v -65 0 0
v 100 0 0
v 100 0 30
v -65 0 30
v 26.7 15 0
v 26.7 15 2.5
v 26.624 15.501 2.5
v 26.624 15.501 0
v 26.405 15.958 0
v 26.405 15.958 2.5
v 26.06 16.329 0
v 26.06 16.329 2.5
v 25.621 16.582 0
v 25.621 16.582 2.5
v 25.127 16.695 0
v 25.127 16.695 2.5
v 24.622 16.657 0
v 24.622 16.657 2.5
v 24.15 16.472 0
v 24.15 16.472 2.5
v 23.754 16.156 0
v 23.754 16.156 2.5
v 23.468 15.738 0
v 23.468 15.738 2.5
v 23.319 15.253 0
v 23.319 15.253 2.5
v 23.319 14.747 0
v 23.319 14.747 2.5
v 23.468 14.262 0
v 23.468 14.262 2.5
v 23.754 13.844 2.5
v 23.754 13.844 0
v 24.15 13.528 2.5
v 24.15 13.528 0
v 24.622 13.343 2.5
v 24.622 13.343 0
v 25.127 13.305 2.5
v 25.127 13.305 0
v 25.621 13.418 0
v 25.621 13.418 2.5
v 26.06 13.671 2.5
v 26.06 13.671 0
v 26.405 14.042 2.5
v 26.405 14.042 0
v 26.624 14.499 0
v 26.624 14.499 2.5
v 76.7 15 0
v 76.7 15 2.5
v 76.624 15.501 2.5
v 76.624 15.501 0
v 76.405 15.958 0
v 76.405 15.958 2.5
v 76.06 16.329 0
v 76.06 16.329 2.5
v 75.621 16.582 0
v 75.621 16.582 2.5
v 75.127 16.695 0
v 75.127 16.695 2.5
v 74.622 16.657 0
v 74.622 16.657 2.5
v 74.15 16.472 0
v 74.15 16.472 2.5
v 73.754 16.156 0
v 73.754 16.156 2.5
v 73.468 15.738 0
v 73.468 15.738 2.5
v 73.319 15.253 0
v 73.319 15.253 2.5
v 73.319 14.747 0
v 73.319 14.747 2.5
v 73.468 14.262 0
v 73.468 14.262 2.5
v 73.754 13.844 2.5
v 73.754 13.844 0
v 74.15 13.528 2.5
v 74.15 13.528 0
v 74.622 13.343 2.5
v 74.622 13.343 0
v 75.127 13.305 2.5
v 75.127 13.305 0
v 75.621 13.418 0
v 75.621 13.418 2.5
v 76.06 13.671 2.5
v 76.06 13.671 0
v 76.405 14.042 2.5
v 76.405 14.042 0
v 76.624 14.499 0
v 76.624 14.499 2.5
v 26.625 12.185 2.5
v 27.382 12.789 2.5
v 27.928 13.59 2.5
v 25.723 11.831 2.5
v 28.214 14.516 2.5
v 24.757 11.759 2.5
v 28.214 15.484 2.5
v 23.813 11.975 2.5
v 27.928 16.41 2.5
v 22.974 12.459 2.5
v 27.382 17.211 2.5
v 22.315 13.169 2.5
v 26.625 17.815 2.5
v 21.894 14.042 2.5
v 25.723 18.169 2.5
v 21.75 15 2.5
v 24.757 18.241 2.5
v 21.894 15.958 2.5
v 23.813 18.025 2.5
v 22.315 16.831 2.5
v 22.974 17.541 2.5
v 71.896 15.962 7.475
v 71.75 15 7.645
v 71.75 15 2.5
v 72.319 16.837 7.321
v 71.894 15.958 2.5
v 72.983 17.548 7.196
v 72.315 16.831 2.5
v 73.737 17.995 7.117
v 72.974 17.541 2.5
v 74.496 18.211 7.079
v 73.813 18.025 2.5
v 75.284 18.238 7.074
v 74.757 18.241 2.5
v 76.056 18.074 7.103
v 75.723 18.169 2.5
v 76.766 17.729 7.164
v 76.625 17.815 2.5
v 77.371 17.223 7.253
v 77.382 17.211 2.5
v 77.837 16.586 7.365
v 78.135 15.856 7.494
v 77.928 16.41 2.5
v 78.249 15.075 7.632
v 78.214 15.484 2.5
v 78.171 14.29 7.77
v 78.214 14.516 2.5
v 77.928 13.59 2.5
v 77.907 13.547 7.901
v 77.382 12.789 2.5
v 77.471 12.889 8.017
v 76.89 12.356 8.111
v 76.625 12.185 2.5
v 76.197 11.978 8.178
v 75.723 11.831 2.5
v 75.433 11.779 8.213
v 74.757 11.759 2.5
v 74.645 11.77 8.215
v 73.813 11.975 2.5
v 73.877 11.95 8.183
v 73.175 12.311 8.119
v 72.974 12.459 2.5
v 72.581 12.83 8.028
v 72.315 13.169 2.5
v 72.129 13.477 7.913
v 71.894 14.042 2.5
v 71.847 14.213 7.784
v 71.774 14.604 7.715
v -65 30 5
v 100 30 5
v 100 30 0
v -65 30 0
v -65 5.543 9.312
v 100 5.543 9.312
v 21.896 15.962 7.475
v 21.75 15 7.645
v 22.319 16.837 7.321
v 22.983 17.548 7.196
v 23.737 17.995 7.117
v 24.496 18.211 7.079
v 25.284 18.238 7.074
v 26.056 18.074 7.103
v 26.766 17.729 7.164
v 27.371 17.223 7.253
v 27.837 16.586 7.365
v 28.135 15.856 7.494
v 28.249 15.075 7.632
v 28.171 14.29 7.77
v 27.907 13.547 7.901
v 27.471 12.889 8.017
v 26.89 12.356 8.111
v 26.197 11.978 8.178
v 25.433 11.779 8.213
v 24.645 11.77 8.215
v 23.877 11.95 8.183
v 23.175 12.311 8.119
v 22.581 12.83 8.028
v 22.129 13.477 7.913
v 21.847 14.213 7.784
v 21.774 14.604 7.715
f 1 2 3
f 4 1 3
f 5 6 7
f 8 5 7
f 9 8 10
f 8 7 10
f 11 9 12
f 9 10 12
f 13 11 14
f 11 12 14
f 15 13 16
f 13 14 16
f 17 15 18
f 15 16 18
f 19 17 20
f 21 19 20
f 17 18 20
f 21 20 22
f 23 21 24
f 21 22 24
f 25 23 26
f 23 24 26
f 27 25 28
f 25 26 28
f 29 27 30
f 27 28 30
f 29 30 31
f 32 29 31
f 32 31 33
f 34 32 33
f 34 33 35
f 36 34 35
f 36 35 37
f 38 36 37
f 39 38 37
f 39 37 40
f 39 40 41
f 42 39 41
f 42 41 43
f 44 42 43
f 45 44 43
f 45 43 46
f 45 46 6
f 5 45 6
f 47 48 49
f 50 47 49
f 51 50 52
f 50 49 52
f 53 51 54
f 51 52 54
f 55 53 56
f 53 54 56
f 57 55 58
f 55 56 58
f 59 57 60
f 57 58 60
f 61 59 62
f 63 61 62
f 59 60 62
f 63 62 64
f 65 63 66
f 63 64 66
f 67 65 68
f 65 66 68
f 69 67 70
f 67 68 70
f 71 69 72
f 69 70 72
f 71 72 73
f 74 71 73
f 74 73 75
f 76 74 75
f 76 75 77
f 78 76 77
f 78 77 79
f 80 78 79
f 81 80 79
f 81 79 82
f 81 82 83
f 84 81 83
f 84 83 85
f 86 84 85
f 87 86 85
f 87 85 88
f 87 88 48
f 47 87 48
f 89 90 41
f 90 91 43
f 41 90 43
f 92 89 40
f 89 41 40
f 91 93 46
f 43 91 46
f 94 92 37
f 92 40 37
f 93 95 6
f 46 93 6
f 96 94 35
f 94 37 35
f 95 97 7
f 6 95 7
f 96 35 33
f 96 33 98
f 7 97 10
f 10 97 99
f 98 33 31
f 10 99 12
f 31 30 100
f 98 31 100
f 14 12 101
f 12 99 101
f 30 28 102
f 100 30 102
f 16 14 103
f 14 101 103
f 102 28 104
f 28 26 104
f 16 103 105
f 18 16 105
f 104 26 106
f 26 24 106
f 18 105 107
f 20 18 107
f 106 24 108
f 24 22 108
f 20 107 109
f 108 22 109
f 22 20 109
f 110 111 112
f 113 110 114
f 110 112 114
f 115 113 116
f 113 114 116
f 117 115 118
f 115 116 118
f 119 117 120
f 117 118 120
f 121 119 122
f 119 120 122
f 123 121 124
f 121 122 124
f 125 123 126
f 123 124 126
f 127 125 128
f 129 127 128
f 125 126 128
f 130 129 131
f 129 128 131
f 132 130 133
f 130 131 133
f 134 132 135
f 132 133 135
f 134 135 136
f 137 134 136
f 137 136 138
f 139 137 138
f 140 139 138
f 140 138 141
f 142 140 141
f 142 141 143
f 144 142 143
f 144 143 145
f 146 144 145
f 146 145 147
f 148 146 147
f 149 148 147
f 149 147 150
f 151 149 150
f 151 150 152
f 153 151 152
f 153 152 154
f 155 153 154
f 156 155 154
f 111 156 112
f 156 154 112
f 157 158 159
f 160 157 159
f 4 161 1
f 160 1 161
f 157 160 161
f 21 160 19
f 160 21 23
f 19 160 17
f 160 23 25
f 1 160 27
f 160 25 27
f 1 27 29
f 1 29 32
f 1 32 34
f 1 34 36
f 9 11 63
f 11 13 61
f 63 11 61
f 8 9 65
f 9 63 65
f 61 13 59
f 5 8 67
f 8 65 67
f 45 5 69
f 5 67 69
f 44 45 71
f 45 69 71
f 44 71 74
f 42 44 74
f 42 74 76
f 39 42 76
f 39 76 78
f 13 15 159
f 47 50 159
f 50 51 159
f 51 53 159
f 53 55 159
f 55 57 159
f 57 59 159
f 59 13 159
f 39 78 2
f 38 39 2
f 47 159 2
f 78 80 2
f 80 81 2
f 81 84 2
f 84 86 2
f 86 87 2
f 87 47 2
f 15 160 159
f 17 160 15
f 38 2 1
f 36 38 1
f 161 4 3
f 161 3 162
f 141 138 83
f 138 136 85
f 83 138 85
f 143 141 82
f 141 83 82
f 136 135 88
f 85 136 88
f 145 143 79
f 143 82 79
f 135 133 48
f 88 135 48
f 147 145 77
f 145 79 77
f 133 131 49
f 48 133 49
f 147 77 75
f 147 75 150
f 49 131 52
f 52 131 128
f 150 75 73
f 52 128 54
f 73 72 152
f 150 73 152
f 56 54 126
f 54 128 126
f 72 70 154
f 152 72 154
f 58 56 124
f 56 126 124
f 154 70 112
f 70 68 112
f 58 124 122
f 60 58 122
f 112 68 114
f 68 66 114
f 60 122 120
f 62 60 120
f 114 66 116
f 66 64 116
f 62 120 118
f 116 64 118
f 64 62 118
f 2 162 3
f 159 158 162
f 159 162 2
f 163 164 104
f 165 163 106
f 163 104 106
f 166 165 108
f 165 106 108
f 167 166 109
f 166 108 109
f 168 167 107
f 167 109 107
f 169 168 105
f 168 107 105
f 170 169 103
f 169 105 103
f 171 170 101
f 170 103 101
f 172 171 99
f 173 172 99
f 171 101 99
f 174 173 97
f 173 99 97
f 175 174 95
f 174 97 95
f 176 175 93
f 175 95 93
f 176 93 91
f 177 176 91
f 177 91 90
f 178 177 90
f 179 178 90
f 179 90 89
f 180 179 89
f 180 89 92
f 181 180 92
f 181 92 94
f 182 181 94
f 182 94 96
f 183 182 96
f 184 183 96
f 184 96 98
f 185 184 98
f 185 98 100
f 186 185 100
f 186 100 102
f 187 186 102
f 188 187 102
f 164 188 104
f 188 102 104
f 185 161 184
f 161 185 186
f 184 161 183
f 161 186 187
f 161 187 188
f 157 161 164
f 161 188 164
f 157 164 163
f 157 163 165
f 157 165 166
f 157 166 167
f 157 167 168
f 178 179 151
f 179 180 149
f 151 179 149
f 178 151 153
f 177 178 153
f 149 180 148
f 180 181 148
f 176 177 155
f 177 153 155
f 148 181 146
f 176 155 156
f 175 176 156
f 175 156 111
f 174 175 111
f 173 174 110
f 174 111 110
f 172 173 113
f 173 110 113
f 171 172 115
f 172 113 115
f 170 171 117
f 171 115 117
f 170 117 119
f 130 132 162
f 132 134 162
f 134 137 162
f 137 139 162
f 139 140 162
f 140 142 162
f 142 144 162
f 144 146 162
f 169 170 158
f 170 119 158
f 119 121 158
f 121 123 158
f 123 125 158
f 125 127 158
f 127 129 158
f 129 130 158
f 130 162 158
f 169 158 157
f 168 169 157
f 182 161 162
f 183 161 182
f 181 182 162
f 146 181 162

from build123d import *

# Parameters (mm, degrees)
BOSS_EXTRUDE1_DEPTH  = 100
M3_CLEARANCE_HOLE1_D = 3.4
SKETCH4_R            = 3.25
CUT_EXTRUDE1_DEPTH   = 108.964114408
BOSS_EXTRUDE2_DEPTH  = 65


with BuildPart() as part:
    # Sketch1 → Boss-Extrude1 (new body)
    with BuildSketch(Plane(origin=(0, 0, 0), x_dir=(0, 0, -1), z_dir=(1, 0, 0))):
        Polygon((0, 0), (0, 30), (-5, 30), (-9.312388631, 5.54322876), (-30, 0), align=None)
    extrude(amount=BOSS_EXTRUDE1_DEPTH)

    # M3 Clearance Hole1 (through all)
    with Locations(Plane(origin=(0, 0, 0), x_dir=(-1, 0, 0), z_dir=(0, 0, -1))):
        with Locations((-25, 15), (-75, 15)):
            Hole(M3_CLEARANCE_HOLE1_D / 2)

    # Sketch4 → Cut-Extrude1 (cut, through all)
    with BuildSketch(Plane(origin=(0, 0, 2.5), x_dir=(-1, 0, 0), z_dir=(0, 0, -1))):
        with Locations((-75, 15)):
            Circle(SKETCH4_R)
        with Locations((-25, 15)):
            Circle(SKETCH4_R)
    extrude(amount=-CUT_EXTRUDE1_DEPTH, mode=Mode.SUBTRACT)

    # Sketch6 → Boss-Extrude2 (add)
    with BuildSketch(Plane.ZY):
        Polygon((0, 0), (30, 0), (9.312388631, 5.54322876), (5, 30), (0, 30), align=None)
    extrude(amount=BOSS_EXTRUDE2_DEPTH)


solid = part.part
